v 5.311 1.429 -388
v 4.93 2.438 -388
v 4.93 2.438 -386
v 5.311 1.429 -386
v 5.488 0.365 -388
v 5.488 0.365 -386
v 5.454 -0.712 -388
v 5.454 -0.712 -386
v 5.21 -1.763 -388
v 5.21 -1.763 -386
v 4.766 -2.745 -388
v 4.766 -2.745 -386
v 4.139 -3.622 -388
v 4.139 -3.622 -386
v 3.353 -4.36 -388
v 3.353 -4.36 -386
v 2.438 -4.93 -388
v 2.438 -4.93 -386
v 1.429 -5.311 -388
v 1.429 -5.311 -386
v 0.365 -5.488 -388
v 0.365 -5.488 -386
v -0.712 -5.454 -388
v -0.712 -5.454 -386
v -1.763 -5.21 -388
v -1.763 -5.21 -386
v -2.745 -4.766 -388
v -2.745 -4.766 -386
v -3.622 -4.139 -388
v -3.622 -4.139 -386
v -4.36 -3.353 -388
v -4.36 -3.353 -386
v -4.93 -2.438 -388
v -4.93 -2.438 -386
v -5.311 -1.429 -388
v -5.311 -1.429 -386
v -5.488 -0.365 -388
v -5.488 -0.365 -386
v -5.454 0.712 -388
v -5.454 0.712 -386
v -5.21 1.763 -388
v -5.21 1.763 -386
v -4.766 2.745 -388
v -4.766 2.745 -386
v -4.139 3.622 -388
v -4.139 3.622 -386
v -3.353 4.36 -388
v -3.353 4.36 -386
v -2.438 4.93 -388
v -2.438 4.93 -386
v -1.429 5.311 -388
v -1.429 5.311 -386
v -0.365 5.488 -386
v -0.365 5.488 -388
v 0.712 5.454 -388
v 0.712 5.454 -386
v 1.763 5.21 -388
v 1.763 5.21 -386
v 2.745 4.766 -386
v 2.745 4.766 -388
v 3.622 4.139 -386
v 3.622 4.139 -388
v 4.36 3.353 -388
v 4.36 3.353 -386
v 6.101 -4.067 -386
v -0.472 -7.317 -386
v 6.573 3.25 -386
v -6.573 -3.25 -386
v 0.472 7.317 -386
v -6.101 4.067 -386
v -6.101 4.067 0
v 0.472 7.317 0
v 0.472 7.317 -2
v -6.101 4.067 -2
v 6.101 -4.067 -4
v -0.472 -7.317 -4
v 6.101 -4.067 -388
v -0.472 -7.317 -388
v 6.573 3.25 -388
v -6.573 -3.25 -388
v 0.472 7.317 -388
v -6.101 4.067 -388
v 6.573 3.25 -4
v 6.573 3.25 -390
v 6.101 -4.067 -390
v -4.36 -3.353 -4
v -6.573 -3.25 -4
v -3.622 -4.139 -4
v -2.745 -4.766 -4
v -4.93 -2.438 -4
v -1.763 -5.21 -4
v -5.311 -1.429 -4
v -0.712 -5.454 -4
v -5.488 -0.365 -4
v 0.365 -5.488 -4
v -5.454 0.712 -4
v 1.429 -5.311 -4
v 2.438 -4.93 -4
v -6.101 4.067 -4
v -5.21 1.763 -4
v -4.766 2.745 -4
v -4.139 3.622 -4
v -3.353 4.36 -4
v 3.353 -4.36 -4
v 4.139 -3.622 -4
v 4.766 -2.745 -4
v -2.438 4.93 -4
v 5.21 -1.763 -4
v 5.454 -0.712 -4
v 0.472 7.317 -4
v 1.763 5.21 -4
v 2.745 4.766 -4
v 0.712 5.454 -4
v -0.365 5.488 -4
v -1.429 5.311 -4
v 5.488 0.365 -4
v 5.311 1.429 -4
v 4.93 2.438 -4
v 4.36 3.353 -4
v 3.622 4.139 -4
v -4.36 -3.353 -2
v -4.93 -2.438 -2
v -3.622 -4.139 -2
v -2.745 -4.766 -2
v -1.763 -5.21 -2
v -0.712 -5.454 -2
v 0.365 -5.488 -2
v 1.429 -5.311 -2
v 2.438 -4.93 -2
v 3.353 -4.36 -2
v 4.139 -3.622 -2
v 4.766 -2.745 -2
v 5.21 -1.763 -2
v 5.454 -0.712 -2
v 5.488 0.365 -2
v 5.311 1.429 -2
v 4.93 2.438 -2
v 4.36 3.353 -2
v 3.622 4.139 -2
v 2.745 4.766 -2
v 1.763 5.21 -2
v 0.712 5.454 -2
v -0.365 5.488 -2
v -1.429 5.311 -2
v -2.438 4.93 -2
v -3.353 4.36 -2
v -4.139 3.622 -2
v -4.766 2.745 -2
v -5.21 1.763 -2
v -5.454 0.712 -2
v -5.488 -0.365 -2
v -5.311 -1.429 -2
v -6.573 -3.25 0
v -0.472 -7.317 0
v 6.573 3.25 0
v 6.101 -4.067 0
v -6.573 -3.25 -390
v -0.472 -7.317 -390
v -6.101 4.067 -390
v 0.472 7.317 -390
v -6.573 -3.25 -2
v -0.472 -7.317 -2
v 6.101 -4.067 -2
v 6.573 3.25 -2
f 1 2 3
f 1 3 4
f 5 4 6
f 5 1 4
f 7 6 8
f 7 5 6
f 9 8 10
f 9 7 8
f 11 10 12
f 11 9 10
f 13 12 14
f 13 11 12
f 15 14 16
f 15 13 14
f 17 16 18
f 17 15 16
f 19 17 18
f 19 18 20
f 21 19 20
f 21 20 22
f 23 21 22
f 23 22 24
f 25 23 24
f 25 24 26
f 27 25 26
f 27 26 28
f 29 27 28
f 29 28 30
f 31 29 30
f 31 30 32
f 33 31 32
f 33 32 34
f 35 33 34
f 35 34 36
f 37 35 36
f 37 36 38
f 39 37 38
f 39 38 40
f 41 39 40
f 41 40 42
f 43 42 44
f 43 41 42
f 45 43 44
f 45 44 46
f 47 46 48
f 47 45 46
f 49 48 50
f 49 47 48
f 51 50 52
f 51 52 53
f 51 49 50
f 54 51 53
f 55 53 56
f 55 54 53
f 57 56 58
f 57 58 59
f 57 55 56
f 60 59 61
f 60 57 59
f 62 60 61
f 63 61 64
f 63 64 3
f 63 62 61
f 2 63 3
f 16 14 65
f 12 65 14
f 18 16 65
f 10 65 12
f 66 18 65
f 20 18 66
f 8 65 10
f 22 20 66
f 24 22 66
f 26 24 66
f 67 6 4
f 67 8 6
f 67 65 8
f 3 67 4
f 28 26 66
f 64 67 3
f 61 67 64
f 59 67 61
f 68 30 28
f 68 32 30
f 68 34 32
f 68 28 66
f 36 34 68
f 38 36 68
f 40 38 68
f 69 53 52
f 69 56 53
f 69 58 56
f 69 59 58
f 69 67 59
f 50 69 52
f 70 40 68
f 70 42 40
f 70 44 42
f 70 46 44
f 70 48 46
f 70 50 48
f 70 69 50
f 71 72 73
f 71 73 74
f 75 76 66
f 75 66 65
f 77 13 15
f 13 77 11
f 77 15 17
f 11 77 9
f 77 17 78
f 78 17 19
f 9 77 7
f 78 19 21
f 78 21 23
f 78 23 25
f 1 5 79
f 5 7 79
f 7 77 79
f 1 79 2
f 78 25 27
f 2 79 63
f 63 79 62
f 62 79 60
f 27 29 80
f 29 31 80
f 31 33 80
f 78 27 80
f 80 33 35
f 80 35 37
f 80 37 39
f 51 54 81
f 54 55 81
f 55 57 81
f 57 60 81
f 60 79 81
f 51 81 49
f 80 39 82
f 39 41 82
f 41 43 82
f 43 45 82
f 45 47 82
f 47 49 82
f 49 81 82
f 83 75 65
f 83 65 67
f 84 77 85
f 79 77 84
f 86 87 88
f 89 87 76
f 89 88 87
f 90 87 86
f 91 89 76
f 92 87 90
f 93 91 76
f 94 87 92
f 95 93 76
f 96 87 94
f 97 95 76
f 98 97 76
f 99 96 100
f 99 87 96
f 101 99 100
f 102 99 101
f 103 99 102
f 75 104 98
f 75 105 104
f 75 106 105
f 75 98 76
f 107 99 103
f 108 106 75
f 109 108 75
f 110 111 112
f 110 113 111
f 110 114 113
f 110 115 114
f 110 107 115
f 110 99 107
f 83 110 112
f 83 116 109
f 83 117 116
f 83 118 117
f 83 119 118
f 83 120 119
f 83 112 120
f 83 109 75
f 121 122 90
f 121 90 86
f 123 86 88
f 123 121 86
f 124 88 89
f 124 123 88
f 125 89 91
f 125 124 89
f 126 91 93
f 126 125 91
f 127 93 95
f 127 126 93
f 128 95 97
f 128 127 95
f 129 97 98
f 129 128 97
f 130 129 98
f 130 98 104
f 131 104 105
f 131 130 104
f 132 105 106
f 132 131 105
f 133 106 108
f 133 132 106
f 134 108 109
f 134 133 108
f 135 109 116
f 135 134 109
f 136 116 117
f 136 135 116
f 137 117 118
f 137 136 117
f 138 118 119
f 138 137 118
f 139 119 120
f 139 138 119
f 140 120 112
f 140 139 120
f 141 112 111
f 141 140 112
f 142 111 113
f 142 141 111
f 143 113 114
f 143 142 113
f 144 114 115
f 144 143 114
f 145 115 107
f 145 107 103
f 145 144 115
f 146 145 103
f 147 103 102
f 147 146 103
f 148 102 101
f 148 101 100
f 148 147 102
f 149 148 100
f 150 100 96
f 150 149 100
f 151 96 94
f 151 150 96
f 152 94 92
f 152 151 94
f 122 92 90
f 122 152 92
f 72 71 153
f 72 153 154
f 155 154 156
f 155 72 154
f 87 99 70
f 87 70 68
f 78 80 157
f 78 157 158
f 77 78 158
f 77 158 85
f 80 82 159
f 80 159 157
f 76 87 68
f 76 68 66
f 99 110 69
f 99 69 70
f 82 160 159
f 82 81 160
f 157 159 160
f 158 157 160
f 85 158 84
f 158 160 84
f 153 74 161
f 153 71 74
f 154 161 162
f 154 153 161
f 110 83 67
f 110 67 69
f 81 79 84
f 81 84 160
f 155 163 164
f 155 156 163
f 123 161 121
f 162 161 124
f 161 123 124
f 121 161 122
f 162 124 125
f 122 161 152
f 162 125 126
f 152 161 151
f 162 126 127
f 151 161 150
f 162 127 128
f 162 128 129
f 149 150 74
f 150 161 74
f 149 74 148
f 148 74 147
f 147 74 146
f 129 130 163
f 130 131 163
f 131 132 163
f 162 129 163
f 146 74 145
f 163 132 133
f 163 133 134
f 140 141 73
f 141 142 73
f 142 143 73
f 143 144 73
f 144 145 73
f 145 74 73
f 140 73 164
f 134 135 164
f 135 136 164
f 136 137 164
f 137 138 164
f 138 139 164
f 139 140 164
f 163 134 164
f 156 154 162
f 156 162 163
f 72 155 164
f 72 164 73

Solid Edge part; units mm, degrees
sketch "Sketch1" plane through (0, 0, 0) normal (0, 0, 1) x (1, 0, 0)
  line L0 (-6.1009, 4.0673) -> (-6.5728, -3.2499)
  line L1 (-6.5728, -3.2499) -> (-0.4719, -7.3171)
  line L2 (-0.4719, -7.3171) -> (6.1009, -4.0673)
  line L3 (6.1009, -4.0673) -> (6.5728, 3.2499)
  line L4 (6.5728, 3.2499) -> (0.4719, 7.3171)
  line L5 (0.4719, 7.3171) -> (-6.1009, 4.0673)
extrude "Protrusion1" add sketch "Sketch1" against normal blind 390
sketch "Sketch2" plane through (0, 0, -2) normal (0, 0, 1) x (-0.8964, -0.4432, 0)
  circle A0 centre (0, 0) radius 5.5
  circle A1 centre (0, 0) radius 13.1424
extrude "ExtrudedCutout_1" cut sketch "Sketch2" against normal blind 2
sketch "Sketch3" plane through (0, 0, -388) normal (0, 0, -1) x (0.8964, 0.4432, 0)
  circle A0 centre (0, 0) radius 5.5
  circle A1 centre (0, 0) radius 13.1424
extrude "ExtrudedCutout_2" cut sketch "Sketch3" against normal blind 2
properties part number "BumbleB0247"
